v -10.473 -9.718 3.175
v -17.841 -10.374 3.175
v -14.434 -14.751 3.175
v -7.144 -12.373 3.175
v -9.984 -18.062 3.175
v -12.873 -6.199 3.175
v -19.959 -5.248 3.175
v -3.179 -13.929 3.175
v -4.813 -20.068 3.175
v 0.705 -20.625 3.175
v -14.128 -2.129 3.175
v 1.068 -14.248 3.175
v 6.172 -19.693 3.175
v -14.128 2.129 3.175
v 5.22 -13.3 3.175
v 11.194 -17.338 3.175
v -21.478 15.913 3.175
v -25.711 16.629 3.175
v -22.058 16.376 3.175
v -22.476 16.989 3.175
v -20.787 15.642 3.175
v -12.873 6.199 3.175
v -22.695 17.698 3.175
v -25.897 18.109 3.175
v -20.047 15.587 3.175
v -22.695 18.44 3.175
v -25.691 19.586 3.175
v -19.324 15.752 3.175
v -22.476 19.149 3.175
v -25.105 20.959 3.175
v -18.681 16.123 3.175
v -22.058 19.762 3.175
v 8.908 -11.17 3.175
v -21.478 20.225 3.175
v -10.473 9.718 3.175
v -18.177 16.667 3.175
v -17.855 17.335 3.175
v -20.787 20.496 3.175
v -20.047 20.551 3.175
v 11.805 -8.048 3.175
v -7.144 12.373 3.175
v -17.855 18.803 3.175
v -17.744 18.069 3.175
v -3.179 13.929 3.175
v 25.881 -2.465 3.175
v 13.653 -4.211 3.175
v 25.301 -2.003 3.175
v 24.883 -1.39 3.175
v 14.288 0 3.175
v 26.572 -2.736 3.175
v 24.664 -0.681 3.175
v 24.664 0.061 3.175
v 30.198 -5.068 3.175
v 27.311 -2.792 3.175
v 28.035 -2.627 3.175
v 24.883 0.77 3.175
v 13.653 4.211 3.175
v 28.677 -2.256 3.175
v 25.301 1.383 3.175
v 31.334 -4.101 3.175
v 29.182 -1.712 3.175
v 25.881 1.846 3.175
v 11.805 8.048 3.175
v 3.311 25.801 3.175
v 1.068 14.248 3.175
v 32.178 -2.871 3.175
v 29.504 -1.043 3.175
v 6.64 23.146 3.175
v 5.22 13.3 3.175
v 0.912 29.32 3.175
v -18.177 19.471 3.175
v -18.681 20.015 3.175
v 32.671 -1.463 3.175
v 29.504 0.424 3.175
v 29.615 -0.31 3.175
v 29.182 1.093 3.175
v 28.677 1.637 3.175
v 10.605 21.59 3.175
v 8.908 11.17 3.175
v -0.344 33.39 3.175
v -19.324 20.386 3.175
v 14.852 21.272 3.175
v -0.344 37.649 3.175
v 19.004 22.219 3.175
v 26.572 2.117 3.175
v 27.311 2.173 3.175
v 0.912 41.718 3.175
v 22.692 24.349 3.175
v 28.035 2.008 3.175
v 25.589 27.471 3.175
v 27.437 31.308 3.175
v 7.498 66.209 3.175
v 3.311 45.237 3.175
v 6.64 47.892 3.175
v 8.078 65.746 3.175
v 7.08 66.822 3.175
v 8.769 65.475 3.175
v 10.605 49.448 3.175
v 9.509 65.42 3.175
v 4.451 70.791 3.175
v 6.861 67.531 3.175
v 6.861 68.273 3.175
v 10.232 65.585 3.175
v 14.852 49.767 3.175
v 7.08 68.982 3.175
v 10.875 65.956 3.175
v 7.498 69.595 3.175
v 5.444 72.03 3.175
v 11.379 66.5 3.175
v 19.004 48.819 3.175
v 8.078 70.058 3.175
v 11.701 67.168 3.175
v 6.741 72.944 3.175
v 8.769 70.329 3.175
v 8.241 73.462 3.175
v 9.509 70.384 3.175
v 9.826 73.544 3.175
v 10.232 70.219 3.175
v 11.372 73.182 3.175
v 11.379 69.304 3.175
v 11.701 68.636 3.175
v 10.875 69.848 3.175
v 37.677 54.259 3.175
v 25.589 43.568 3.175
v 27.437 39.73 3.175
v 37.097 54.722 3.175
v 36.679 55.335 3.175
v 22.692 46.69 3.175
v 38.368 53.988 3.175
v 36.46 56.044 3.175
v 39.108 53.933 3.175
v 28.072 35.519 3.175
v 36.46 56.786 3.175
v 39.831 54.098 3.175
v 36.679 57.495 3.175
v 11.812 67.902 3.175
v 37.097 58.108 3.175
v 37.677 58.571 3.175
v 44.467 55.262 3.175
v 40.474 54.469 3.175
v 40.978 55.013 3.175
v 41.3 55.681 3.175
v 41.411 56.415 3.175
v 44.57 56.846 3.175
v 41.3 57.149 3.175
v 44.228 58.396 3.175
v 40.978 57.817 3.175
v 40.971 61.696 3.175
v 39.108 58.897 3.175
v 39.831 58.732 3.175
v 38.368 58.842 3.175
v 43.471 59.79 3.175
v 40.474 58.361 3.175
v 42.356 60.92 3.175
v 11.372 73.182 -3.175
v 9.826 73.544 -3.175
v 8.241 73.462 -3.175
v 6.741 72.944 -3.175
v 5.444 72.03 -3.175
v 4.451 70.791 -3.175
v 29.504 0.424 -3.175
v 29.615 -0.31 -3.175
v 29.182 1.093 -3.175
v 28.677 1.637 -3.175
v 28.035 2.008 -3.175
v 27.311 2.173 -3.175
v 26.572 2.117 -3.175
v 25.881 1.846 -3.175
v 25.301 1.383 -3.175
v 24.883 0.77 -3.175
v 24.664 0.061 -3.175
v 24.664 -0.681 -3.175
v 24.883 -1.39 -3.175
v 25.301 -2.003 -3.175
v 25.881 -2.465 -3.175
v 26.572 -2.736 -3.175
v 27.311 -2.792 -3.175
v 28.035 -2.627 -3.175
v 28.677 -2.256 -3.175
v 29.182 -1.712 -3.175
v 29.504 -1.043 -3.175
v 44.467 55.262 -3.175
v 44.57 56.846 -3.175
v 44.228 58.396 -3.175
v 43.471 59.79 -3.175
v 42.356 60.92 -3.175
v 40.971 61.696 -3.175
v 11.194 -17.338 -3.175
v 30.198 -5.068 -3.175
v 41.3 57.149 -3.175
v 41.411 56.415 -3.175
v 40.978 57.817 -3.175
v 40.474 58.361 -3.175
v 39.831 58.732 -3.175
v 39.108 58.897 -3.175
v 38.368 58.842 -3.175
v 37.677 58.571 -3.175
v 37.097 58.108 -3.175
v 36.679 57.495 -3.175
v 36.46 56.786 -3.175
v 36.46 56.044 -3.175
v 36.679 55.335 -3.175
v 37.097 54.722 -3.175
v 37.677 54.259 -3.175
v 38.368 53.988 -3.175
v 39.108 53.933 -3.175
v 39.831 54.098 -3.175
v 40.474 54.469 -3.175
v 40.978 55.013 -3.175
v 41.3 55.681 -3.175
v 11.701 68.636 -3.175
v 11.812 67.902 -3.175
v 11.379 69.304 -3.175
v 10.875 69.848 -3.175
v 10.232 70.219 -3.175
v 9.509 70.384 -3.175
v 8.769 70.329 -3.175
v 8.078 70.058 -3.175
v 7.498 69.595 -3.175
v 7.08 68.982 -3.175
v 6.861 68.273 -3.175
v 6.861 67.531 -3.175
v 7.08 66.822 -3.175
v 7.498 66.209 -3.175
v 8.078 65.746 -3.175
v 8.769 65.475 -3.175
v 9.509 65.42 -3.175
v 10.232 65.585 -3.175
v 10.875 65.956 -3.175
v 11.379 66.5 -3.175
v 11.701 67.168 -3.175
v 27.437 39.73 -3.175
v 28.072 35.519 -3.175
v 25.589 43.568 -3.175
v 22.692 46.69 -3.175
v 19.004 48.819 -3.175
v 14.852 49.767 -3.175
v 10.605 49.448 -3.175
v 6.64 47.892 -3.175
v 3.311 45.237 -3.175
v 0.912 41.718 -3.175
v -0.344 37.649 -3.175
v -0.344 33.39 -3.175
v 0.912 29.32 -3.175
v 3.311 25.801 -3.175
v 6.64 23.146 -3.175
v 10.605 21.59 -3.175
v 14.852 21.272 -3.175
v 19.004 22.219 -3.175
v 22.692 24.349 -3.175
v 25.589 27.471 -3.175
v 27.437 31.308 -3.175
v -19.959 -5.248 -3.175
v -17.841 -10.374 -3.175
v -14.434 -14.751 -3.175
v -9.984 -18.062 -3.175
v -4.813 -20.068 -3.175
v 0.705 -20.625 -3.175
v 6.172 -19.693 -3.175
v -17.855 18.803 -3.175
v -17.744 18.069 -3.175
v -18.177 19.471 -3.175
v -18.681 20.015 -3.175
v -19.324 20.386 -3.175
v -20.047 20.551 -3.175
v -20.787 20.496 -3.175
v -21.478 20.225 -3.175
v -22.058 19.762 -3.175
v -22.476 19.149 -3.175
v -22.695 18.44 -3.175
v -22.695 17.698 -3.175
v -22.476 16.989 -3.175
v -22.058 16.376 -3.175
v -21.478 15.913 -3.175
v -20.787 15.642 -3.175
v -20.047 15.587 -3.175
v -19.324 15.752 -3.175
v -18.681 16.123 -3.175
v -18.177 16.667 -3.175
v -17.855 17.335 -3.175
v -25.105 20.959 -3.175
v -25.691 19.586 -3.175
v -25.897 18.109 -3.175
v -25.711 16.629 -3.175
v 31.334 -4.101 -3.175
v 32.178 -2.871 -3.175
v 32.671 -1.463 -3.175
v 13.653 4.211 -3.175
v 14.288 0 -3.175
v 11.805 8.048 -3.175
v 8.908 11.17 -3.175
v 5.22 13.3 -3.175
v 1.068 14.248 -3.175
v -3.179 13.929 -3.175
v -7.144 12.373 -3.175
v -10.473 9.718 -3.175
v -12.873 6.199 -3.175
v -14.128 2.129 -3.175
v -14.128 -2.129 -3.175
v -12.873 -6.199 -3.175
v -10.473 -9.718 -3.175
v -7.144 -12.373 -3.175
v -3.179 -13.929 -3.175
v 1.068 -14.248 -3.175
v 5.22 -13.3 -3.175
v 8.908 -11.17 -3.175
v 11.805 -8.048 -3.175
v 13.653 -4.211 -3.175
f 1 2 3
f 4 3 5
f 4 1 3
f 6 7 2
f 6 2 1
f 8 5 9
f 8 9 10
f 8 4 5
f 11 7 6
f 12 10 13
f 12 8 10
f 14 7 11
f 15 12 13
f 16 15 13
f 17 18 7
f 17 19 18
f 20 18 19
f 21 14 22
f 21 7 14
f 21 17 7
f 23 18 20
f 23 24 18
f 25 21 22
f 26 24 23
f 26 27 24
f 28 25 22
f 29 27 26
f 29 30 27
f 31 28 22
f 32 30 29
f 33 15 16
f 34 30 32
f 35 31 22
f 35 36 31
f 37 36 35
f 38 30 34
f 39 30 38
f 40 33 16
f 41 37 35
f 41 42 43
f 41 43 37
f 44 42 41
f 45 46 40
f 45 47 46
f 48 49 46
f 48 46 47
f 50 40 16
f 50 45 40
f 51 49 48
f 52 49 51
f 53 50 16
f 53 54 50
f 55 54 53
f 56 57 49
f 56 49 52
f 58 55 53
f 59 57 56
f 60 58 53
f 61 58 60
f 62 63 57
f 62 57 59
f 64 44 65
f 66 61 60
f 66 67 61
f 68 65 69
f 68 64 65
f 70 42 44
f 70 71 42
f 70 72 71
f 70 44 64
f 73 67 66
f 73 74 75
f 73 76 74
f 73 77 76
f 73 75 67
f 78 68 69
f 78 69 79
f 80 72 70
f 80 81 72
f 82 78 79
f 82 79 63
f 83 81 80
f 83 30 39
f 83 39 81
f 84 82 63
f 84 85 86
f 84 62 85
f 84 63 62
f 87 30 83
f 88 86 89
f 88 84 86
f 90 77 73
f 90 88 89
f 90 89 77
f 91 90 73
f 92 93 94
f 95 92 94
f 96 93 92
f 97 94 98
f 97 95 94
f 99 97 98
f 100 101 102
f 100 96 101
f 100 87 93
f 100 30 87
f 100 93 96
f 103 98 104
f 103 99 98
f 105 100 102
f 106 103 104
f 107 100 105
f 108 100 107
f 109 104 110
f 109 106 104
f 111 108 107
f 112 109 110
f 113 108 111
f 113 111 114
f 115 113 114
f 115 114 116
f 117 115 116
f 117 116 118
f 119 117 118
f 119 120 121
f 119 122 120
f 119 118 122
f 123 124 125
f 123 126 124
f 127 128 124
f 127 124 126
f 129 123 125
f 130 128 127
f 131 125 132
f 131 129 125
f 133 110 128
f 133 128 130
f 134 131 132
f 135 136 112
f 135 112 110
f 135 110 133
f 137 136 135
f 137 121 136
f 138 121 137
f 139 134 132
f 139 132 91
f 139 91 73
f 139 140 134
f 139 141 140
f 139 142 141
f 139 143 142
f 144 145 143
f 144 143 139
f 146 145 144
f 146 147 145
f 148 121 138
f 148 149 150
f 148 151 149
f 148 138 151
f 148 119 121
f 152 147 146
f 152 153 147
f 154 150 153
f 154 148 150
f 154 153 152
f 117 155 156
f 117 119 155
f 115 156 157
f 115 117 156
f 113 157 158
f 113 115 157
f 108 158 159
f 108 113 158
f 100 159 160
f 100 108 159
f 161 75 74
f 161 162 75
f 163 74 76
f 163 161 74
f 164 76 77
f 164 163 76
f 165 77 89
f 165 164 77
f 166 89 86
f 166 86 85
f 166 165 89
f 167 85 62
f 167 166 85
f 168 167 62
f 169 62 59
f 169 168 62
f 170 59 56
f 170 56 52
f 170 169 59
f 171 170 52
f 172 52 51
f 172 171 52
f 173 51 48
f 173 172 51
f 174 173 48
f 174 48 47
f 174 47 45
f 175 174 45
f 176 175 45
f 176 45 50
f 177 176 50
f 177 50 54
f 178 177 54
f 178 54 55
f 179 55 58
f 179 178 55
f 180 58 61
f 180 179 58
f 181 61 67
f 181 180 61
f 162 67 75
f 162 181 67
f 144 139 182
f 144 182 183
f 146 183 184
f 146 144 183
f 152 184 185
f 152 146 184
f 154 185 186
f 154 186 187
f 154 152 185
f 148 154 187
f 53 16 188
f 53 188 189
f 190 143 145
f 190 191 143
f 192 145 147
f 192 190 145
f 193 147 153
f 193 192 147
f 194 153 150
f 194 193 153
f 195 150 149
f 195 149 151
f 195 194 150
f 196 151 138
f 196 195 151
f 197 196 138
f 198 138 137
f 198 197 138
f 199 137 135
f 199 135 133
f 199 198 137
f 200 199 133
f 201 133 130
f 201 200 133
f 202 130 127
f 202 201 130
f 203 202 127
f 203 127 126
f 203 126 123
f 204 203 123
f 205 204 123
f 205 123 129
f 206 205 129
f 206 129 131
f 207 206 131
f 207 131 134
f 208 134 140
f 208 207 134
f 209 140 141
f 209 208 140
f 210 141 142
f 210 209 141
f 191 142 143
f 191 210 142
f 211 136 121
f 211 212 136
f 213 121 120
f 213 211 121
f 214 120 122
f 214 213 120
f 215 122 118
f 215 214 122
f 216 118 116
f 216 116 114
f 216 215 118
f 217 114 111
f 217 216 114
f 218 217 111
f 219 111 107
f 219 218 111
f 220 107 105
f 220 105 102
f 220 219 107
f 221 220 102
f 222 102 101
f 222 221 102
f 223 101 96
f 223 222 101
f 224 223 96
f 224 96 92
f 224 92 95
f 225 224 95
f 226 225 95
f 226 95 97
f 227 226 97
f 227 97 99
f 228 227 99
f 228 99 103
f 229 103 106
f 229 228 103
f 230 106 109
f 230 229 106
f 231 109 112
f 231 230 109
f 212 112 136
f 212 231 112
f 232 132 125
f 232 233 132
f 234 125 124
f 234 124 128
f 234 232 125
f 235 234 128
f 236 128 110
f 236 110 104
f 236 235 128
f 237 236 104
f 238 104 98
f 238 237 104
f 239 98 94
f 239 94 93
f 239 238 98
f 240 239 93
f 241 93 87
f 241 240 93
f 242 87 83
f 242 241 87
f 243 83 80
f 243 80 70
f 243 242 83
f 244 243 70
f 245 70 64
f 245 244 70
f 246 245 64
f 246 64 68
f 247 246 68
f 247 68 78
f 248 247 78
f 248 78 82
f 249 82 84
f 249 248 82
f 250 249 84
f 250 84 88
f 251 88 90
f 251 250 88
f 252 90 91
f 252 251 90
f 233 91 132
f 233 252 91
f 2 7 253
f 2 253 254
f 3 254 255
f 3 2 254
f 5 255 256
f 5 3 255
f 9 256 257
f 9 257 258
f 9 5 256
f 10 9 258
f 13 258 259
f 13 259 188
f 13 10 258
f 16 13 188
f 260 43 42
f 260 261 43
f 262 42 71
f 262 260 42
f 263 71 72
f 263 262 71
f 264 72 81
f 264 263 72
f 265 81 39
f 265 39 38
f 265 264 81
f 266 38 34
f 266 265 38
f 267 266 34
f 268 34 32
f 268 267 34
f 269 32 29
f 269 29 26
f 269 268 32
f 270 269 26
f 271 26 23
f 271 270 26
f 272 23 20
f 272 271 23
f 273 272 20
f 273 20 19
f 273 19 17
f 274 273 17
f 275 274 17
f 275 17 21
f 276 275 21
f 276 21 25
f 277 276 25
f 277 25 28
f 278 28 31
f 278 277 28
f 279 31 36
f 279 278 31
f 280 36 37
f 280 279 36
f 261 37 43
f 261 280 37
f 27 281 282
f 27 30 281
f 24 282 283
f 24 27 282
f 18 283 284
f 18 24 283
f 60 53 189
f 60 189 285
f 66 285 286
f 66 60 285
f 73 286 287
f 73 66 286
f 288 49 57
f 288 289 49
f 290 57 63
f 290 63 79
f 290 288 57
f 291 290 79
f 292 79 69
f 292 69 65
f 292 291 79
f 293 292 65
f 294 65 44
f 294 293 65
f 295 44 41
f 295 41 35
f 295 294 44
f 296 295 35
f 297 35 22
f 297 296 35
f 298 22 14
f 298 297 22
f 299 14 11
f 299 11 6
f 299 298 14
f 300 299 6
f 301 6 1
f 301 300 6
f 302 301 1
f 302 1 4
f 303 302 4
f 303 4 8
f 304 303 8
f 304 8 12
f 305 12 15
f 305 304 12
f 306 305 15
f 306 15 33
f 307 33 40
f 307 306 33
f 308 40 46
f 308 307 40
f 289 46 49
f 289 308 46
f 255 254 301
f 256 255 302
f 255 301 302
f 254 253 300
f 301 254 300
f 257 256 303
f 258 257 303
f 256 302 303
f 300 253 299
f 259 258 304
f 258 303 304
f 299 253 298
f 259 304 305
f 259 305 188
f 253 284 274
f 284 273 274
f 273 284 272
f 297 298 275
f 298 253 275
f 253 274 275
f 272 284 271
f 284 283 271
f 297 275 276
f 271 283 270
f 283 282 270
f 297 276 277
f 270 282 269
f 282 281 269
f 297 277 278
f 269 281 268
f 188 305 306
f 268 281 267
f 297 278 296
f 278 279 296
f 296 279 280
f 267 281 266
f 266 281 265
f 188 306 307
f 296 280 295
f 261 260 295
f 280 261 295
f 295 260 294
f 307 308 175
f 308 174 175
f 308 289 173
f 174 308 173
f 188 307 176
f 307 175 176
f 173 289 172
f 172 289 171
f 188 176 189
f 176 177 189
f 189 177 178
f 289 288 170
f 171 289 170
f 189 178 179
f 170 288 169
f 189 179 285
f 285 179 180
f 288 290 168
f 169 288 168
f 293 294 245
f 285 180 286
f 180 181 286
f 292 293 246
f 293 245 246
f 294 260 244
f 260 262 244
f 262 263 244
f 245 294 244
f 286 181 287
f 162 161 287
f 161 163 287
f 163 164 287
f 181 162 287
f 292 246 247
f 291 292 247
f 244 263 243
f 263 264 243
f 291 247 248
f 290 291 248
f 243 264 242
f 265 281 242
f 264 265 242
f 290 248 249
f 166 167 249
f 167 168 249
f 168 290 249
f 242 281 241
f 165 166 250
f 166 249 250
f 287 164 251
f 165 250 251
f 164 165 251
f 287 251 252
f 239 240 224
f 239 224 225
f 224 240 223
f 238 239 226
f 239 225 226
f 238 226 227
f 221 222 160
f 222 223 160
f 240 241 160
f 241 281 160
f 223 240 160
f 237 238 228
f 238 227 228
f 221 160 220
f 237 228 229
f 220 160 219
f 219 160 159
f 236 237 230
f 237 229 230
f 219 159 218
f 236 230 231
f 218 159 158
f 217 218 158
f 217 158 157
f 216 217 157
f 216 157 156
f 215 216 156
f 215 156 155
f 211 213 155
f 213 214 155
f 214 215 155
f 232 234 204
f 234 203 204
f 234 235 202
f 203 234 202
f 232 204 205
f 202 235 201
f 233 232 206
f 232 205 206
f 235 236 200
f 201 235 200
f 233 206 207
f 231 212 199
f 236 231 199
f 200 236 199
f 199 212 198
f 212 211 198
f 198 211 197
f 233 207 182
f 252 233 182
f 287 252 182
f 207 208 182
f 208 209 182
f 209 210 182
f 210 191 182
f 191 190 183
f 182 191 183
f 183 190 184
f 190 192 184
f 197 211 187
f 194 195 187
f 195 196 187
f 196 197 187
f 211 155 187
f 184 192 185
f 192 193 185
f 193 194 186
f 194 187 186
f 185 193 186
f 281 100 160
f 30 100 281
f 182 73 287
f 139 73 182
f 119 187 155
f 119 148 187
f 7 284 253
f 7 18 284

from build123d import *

# Parameters (mm, degrees)
SKETCH1_R           = 14.2875
SKETCH1_R_2         = 2.4892
BOSS_EXTRUDE1_DEPTH = 3.175


with BuildPart() as part:
    # Sketch1 → Boss-Extrude1 (new, symmetric)
    with BuildSketch(Plane.XY):
        with BuildLine():
            Line((-25.711392616, 16.628788534), (-19.959064153, -5.248062916))
            ThreePointArc((-19.959064153, -5.248062916), (-7.46638511, -19.239529611), (11.194044807, -17.337813216))
            Line((11.194044807, -17.337813216), (30.197779716, -5.06817705))
            ThreePointArc((30.197779716, -5.06817705), (31.796268643, -3.513762679), (32.671001067, -1.462857007))
            Line((32.671001067, -1.462857007), (44.467361552, 55.261864273))
            ThreePointArc((44.467361552, 55.261864273), (43.898602792, 59.119668038), (40.971040985, 61.695618015))
            Line((40.971040985, 61.695618015), (11.371764661, 73.182364338))
            ThreePointArc((11.371764661, 73.182364338), (7.472947104, 73.255563185), (4.450757502, 70.791317575))
            Line((4.450757502, 70.791317575), (-25.105168777, 20.958644089))
            ThreePointArc((-25.105168777, 20.958644089), (-25.842883045, 18.854565063), (-25.711392616, 16.628788534))
        make_face()
        Circle(SKETCH1_R, mode=Mode.SUBTRACT)
        with Locations((13.784095588, 35.519131589)):
            Circle(SKETCH1_R, mode=Mode.SUBTRACT)
        with Locations((-20.233397162, 18.069179956)):
            Circle(SKETCH1_R_2, mode=Mode.SUBTRACT)
        with Locations((27.125444956, -0.309614161)):
            Circle(SKETCH1_R_2, mode=Mode.SUBTRACT)
        with Locations((38.921805441, 56.415107119)):
            Circle(SKETCH1_R_2, mode=Mode.SUBTRACT)
        with Locations((9.322529117, 67.901853442)):
            Circle(SKETCH1_R_2, mode=Mode.SUBTRACT)
    extrude(amount=BOSS_EXTRUDE1_DEPTH, both=True)


solid = part.part
